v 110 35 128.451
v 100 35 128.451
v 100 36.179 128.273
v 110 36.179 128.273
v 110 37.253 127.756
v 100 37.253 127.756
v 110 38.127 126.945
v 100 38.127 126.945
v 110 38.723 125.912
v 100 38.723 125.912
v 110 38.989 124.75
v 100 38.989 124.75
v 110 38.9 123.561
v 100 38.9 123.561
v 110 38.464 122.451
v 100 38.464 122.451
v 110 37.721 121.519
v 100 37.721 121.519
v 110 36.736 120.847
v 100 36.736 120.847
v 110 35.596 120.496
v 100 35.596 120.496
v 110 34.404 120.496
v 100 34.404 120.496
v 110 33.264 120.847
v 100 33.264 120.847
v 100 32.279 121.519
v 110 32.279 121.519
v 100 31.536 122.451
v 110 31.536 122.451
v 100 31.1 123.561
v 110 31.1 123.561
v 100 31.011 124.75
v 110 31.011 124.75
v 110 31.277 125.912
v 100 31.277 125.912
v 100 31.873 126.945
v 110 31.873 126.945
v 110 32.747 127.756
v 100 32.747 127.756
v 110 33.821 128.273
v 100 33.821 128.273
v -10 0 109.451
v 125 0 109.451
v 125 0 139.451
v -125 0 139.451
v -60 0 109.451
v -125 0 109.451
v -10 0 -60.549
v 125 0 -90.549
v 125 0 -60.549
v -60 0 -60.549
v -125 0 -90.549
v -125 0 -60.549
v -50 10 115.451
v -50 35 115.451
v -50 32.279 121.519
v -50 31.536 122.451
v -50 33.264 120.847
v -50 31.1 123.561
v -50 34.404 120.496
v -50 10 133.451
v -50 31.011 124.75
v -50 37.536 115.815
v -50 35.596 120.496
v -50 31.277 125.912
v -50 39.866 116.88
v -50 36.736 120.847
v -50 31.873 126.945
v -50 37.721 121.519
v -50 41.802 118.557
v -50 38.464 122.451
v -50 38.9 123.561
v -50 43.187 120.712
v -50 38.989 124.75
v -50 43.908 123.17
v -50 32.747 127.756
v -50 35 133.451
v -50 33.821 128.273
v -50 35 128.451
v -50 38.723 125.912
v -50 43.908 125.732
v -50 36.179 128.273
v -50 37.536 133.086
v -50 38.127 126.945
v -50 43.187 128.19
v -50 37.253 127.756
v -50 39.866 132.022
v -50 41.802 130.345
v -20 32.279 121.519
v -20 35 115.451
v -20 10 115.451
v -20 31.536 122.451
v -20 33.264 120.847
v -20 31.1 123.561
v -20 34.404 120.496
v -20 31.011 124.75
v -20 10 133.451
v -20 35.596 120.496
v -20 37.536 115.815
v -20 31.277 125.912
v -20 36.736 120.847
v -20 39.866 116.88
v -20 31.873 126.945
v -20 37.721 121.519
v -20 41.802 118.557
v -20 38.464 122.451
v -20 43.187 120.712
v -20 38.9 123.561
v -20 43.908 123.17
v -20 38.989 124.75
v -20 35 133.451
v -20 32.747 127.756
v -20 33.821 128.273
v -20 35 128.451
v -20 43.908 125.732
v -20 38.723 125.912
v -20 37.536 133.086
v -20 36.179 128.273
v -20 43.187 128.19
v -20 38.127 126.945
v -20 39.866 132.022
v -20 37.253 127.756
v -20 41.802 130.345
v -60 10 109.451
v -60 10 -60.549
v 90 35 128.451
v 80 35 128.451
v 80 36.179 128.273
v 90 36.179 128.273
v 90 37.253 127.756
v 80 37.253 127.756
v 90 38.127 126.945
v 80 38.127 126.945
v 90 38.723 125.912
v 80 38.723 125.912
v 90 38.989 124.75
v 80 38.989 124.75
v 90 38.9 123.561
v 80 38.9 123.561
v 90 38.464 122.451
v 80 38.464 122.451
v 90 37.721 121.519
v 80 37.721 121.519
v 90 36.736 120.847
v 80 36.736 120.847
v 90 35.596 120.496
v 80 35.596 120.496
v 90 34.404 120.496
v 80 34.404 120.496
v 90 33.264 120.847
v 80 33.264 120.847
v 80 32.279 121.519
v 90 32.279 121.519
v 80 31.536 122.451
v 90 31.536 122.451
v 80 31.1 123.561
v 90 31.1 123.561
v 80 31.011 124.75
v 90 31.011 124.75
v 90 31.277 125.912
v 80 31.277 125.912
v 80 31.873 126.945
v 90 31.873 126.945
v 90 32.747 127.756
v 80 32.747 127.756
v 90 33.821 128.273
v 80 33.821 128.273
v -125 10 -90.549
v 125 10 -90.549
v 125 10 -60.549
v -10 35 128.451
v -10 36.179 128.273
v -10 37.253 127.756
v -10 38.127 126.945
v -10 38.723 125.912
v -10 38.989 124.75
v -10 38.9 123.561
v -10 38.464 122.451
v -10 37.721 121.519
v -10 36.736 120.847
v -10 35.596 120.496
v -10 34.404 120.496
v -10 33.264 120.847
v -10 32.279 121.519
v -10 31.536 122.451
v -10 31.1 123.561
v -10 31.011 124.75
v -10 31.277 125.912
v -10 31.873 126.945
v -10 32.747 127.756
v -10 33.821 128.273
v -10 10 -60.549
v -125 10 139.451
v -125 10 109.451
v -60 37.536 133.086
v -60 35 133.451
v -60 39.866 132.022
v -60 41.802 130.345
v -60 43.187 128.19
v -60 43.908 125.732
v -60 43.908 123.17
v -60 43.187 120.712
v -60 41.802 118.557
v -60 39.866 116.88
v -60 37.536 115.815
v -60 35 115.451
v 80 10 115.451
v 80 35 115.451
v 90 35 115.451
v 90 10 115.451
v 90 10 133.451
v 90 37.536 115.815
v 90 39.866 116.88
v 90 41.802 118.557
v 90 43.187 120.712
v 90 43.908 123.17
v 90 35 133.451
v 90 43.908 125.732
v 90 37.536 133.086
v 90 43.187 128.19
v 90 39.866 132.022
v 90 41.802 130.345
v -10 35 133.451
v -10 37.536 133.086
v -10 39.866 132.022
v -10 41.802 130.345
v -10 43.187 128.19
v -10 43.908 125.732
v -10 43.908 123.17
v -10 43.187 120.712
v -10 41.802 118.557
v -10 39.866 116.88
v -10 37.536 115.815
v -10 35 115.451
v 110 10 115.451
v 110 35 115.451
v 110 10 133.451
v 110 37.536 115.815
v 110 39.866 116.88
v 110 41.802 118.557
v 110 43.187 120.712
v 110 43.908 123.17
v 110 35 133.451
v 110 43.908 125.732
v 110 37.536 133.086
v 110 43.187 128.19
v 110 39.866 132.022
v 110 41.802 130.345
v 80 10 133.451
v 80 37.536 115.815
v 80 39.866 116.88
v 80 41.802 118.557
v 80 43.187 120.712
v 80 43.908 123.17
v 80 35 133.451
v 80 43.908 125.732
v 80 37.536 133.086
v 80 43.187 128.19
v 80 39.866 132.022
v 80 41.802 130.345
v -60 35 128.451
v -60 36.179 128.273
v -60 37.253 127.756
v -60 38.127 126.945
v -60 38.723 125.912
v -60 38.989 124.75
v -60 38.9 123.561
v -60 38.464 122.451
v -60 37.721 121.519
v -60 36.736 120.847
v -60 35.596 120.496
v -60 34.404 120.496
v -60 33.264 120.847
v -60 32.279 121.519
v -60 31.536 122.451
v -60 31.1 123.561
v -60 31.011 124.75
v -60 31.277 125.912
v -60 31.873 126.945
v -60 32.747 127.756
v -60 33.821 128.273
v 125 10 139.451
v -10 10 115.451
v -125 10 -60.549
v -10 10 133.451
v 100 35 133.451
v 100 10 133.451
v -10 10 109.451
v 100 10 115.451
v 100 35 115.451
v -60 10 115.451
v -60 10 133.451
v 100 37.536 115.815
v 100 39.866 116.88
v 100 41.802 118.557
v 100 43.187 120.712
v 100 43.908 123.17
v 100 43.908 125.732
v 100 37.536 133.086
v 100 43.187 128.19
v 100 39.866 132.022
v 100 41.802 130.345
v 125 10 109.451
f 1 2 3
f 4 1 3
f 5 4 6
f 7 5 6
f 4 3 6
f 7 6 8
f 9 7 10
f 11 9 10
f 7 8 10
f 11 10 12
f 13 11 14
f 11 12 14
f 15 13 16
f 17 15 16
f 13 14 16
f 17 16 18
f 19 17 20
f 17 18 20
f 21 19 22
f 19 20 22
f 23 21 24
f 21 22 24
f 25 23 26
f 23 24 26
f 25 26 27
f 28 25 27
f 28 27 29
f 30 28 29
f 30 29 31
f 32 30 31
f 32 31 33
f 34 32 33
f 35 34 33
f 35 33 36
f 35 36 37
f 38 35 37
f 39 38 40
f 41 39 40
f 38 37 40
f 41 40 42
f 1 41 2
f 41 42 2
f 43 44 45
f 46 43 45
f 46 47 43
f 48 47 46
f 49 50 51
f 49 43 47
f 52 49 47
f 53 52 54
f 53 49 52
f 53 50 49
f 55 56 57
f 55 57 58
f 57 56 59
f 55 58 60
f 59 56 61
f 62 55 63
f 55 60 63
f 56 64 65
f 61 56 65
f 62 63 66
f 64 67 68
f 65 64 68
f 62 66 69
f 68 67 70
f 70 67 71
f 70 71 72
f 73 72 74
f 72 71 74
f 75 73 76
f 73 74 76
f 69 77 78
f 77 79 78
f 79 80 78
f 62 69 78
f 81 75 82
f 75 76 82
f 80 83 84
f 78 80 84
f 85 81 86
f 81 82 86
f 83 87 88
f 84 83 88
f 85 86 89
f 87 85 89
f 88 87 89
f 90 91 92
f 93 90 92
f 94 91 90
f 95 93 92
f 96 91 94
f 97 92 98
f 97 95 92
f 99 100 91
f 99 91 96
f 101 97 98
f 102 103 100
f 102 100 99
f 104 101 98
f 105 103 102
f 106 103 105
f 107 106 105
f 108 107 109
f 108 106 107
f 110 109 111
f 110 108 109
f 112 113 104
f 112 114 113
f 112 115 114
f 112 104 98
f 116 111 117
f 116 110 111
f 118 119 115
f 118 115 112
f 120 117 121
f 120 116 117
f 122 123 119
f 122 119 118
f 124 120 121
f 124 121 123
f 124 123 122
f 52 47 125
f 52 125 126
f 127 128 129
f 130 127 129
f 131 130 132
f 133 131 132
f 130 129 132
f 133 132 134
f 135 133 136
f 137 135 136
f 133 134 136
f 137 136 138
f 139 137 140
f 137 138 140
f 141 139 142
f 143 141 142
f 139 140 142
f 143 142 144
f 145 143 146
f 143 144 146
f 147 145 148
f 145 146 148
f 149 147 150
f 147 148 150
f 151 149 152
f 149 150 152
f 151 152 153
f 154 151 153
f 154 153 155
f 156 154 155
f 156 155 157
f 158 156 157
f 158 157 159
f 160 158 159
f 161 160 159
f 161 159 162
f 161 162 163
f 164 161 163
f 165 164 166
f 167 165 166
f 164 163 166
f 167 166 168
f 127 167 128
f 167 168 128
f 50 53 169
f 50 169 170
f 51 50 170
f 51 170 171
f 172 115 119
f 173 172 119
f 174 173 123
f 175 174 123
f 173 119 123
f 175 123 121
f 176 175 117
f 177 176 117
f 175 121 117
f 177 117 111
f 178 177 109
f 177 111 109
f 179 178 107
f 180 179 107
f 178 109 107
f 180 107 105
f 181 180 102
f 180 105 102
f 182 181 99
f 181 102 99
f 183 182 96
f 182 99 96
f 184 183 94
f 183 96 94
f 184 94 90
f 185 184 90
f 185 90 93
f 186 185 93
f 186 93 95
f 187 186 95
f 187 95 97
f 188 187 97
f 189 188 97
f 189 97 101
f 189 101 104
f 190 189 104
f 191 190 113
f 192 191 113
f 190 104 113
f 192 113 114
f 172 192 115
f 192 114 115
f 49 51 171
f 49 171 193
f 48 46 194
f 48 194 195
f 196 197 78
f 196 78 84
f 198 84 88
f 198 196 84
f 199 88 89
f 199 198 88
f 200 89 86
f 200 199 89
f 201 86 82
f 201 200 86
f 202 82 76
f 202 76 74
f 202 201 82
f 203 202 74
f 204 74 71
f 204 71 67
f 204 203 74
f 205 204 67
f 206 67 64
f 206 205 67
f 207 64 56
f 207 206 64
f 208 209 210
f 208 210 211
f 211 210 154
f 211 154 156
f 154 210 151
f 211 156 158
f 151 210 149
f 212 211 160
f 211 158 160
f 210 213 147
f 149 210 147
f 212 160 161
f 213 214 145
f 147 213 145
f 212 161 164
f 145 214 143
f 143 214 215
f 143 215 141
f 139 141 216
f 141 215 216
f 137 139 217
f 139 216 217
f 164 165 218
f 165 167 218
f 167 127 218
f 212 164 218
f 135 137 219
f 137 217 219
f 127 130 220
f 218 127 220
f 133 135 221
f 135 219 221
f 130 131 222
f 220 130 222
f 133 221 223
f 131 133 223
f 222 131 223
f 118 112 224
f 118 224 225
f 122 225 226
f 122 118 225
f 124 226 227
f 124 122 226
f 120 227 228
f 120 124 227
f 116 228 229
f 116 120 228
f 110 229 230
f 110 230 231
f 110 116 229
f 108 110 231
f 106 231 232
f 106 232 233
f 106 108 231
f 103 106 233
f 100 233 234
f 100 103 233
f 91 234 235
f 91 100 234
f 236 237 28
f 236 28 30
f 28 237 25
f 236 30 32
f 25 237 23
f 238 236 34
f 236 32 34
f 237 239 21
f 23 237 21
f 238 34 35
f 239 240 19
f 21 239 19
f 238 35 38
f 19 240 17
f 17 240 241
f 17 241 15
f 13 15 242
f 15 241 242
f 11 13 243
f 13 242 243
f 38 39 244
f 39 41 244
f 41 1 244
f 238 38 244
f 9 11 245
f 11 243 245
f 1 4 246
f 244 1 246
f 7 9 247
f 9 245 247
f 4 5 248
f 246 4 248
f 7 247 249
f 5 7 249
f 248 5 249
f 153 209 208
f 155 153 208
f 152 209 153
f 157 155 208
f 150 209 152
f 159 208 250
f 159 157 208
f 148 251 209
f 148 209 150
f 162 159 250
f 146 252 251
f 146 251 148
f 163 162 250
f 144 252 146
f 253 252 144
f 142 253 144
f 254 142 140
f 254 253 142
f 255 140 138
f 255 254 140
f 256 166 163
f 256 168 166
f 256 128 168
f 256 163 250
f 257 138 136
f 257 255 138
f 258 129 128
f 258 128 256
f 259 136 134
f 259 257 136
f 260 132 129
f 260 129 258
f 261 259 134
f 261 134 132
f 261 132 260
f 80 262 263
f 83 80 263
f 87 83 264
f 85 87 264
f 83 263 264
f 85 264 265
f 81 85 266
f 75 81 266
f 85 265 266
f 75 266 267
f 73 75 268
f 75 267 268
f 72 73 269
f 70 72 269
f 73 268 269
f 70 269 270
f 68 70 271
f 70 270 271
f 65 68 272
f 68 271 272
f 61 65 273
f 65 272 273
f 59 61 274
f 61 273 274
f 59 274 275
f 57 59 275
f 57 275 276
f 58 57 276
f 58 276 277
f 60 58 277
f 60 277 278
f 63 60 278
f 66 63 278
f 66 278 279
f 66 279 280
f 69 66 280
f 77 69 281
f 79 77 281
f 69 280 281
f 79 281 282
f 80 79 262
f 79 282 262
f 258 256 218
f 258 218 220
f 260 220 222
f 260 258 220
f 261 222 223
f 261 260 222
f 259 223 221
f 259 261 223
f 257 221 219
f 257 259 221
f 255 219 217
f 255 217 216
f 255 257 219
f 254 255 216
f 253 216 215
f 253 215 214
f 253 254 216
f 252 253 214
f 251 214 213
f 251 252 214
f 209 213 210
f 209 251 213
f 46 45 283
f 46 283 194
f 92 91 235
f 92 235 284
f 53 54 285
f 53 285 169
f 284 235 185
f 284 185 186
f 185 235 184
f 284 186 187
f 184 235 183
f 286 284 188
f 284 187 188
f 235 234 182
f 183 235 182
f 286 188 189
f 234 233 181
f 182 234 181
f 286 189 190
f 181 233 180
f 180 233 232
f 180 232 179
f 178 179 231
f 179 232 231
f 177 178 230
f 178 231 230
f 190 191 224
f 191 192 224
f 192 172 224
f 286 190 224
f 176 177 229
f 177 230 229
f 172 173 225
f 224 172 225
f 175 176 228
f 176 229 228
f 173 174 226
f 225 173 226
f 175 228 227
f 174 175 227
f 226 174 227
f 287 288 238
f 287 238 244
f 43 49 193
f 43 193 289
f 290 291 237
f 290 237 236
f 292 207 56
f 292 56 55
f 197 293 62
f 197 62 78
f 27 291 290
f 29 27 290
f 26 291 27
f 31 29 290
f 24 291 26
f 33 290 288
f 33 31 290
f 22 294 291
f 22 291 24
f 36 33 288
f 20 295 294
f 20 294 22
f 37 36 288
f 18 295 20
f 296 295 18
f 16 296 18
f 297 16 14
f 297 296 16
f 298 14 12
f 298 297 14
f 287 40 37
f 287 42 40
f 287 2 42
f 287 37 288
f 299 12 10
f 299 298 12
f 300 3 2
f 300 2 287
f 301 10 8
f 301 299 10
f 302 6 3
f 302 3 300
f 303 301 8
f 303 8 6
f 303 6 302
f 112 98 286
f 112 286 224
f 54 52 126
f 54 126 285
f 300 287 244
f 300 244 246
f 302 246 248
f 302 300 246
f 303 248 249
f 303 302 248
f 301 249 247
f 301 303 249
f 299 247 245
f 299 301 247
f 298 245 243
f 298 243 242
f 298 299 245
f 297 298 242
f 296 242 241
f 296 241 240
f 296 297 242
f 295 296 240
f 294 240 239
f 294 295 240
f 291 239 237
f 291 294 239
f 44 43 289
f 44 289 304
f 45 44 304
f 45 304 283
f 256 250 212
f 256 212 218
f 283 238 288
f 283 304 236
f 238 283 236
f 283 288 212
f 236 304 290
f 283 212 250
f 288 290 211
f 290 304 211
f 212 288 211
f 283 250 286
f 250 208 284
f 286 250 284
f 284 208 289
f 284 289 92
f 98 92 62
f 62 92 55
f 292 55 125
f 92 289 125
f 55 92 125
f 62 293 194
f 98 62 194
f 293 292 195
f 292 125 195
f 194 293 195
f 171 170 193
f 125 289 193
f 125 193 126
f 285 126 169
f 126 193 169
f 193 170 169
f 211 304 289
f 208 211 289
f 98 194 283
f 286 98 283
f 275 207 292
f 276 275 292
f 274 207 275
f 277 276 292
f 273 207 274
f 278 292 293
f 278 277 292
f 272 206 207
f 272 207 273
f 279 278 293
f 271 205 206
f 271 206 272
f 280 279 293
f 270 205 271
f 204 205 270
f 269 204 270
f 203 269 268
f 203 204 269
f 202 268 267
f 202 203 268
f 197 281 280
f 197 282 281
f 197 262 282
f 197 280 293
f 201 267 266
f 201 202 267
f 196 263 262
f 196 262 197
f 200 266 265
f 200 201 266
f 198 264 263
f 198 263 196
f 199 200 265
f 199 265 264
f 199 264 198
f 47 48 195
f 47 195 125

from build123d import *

# Parameters (mm, degrees)
BOSS_EXTRUDE1_DEPTH = 10
SKETCH2_R           = 4
BOSS_EXTRUDE2_DEPTH = 10
LPATTERN1_COUNT     = 2
LPATTERN1_PITCH     = 40
LPATTERN2_COUNT     = 2
LPATTERN2_PITCH     = 140
LPATTERN4_COUNT     = 2
LPATTERN4_PITCH     = 160


with BuildPart() as part:
    # Sketch1 → Boss-Extrude1 (new body)
    with BuildSketch(Plane(origin=(0, 0, 0), x_dir=(1, 0, 0), z_dir=(0, 1, 0))):
        Polygon((-125, 90.549169605), (125, 90.549169605), (125, 60.549169605), (-10, 60.549169605), (-10, -109.450830395), (125, -109.450830395), (125, -139.450830395), (-125, -139.450830395), (-125, -109.450830395), (-60, -109.450830395), (-60, 60.549169605), (-125, 60.549169605), align=None)
    extrude(amount=BOSS_EXTRUDE1_DEPTH)

    # Sketch2 → Boss-Extrude2 (add)
    with BuildSketch(Plane.ZY.offset(60)):
        with BuildLine():
            Line((115.450830395, 10), (133.450830395, 10))
            Line((133.450830395, 10), (133.450830395, 35))
            ThreePointArc((133.450830395, 35), (124.450830395, 44), (115.450830395, 35))
            Line((115.450830395, 35), (115.450830395, 10))
        make_face()
        with Locations((124.450830395, 35)):
            Circle(SKETCH2_R, mode=Mode.SUBTRACT)
    boss_extrude2 = extrude(amount=-BOSS_EXTRUDE2_DEPTH)

    # LPattern1: Boss-Extrude2 ×2
    with Locations(*[(i * LPATTERN1_PITCH, 0, 0) for i in range(1, LPATTERN1_COUNT)]):
        add(boss_extrude2)

    # LPattern2: Boss-Extrude2 ×2
    with Locations(*[(i * LPATTERN2_PITCH, 0, 0) for i in range(1, LPATTERN2_COUNT)]):
        add(boss_extrude2)

    # LPattern4: Boss-Extrude2 ×2
    with Locations(*[(i * LPATTERN4_PITCH, 0, 0) for i in range(1, LPATTERN4_COUNT)]):
        add(boss_extrude2)


solid = part.part
